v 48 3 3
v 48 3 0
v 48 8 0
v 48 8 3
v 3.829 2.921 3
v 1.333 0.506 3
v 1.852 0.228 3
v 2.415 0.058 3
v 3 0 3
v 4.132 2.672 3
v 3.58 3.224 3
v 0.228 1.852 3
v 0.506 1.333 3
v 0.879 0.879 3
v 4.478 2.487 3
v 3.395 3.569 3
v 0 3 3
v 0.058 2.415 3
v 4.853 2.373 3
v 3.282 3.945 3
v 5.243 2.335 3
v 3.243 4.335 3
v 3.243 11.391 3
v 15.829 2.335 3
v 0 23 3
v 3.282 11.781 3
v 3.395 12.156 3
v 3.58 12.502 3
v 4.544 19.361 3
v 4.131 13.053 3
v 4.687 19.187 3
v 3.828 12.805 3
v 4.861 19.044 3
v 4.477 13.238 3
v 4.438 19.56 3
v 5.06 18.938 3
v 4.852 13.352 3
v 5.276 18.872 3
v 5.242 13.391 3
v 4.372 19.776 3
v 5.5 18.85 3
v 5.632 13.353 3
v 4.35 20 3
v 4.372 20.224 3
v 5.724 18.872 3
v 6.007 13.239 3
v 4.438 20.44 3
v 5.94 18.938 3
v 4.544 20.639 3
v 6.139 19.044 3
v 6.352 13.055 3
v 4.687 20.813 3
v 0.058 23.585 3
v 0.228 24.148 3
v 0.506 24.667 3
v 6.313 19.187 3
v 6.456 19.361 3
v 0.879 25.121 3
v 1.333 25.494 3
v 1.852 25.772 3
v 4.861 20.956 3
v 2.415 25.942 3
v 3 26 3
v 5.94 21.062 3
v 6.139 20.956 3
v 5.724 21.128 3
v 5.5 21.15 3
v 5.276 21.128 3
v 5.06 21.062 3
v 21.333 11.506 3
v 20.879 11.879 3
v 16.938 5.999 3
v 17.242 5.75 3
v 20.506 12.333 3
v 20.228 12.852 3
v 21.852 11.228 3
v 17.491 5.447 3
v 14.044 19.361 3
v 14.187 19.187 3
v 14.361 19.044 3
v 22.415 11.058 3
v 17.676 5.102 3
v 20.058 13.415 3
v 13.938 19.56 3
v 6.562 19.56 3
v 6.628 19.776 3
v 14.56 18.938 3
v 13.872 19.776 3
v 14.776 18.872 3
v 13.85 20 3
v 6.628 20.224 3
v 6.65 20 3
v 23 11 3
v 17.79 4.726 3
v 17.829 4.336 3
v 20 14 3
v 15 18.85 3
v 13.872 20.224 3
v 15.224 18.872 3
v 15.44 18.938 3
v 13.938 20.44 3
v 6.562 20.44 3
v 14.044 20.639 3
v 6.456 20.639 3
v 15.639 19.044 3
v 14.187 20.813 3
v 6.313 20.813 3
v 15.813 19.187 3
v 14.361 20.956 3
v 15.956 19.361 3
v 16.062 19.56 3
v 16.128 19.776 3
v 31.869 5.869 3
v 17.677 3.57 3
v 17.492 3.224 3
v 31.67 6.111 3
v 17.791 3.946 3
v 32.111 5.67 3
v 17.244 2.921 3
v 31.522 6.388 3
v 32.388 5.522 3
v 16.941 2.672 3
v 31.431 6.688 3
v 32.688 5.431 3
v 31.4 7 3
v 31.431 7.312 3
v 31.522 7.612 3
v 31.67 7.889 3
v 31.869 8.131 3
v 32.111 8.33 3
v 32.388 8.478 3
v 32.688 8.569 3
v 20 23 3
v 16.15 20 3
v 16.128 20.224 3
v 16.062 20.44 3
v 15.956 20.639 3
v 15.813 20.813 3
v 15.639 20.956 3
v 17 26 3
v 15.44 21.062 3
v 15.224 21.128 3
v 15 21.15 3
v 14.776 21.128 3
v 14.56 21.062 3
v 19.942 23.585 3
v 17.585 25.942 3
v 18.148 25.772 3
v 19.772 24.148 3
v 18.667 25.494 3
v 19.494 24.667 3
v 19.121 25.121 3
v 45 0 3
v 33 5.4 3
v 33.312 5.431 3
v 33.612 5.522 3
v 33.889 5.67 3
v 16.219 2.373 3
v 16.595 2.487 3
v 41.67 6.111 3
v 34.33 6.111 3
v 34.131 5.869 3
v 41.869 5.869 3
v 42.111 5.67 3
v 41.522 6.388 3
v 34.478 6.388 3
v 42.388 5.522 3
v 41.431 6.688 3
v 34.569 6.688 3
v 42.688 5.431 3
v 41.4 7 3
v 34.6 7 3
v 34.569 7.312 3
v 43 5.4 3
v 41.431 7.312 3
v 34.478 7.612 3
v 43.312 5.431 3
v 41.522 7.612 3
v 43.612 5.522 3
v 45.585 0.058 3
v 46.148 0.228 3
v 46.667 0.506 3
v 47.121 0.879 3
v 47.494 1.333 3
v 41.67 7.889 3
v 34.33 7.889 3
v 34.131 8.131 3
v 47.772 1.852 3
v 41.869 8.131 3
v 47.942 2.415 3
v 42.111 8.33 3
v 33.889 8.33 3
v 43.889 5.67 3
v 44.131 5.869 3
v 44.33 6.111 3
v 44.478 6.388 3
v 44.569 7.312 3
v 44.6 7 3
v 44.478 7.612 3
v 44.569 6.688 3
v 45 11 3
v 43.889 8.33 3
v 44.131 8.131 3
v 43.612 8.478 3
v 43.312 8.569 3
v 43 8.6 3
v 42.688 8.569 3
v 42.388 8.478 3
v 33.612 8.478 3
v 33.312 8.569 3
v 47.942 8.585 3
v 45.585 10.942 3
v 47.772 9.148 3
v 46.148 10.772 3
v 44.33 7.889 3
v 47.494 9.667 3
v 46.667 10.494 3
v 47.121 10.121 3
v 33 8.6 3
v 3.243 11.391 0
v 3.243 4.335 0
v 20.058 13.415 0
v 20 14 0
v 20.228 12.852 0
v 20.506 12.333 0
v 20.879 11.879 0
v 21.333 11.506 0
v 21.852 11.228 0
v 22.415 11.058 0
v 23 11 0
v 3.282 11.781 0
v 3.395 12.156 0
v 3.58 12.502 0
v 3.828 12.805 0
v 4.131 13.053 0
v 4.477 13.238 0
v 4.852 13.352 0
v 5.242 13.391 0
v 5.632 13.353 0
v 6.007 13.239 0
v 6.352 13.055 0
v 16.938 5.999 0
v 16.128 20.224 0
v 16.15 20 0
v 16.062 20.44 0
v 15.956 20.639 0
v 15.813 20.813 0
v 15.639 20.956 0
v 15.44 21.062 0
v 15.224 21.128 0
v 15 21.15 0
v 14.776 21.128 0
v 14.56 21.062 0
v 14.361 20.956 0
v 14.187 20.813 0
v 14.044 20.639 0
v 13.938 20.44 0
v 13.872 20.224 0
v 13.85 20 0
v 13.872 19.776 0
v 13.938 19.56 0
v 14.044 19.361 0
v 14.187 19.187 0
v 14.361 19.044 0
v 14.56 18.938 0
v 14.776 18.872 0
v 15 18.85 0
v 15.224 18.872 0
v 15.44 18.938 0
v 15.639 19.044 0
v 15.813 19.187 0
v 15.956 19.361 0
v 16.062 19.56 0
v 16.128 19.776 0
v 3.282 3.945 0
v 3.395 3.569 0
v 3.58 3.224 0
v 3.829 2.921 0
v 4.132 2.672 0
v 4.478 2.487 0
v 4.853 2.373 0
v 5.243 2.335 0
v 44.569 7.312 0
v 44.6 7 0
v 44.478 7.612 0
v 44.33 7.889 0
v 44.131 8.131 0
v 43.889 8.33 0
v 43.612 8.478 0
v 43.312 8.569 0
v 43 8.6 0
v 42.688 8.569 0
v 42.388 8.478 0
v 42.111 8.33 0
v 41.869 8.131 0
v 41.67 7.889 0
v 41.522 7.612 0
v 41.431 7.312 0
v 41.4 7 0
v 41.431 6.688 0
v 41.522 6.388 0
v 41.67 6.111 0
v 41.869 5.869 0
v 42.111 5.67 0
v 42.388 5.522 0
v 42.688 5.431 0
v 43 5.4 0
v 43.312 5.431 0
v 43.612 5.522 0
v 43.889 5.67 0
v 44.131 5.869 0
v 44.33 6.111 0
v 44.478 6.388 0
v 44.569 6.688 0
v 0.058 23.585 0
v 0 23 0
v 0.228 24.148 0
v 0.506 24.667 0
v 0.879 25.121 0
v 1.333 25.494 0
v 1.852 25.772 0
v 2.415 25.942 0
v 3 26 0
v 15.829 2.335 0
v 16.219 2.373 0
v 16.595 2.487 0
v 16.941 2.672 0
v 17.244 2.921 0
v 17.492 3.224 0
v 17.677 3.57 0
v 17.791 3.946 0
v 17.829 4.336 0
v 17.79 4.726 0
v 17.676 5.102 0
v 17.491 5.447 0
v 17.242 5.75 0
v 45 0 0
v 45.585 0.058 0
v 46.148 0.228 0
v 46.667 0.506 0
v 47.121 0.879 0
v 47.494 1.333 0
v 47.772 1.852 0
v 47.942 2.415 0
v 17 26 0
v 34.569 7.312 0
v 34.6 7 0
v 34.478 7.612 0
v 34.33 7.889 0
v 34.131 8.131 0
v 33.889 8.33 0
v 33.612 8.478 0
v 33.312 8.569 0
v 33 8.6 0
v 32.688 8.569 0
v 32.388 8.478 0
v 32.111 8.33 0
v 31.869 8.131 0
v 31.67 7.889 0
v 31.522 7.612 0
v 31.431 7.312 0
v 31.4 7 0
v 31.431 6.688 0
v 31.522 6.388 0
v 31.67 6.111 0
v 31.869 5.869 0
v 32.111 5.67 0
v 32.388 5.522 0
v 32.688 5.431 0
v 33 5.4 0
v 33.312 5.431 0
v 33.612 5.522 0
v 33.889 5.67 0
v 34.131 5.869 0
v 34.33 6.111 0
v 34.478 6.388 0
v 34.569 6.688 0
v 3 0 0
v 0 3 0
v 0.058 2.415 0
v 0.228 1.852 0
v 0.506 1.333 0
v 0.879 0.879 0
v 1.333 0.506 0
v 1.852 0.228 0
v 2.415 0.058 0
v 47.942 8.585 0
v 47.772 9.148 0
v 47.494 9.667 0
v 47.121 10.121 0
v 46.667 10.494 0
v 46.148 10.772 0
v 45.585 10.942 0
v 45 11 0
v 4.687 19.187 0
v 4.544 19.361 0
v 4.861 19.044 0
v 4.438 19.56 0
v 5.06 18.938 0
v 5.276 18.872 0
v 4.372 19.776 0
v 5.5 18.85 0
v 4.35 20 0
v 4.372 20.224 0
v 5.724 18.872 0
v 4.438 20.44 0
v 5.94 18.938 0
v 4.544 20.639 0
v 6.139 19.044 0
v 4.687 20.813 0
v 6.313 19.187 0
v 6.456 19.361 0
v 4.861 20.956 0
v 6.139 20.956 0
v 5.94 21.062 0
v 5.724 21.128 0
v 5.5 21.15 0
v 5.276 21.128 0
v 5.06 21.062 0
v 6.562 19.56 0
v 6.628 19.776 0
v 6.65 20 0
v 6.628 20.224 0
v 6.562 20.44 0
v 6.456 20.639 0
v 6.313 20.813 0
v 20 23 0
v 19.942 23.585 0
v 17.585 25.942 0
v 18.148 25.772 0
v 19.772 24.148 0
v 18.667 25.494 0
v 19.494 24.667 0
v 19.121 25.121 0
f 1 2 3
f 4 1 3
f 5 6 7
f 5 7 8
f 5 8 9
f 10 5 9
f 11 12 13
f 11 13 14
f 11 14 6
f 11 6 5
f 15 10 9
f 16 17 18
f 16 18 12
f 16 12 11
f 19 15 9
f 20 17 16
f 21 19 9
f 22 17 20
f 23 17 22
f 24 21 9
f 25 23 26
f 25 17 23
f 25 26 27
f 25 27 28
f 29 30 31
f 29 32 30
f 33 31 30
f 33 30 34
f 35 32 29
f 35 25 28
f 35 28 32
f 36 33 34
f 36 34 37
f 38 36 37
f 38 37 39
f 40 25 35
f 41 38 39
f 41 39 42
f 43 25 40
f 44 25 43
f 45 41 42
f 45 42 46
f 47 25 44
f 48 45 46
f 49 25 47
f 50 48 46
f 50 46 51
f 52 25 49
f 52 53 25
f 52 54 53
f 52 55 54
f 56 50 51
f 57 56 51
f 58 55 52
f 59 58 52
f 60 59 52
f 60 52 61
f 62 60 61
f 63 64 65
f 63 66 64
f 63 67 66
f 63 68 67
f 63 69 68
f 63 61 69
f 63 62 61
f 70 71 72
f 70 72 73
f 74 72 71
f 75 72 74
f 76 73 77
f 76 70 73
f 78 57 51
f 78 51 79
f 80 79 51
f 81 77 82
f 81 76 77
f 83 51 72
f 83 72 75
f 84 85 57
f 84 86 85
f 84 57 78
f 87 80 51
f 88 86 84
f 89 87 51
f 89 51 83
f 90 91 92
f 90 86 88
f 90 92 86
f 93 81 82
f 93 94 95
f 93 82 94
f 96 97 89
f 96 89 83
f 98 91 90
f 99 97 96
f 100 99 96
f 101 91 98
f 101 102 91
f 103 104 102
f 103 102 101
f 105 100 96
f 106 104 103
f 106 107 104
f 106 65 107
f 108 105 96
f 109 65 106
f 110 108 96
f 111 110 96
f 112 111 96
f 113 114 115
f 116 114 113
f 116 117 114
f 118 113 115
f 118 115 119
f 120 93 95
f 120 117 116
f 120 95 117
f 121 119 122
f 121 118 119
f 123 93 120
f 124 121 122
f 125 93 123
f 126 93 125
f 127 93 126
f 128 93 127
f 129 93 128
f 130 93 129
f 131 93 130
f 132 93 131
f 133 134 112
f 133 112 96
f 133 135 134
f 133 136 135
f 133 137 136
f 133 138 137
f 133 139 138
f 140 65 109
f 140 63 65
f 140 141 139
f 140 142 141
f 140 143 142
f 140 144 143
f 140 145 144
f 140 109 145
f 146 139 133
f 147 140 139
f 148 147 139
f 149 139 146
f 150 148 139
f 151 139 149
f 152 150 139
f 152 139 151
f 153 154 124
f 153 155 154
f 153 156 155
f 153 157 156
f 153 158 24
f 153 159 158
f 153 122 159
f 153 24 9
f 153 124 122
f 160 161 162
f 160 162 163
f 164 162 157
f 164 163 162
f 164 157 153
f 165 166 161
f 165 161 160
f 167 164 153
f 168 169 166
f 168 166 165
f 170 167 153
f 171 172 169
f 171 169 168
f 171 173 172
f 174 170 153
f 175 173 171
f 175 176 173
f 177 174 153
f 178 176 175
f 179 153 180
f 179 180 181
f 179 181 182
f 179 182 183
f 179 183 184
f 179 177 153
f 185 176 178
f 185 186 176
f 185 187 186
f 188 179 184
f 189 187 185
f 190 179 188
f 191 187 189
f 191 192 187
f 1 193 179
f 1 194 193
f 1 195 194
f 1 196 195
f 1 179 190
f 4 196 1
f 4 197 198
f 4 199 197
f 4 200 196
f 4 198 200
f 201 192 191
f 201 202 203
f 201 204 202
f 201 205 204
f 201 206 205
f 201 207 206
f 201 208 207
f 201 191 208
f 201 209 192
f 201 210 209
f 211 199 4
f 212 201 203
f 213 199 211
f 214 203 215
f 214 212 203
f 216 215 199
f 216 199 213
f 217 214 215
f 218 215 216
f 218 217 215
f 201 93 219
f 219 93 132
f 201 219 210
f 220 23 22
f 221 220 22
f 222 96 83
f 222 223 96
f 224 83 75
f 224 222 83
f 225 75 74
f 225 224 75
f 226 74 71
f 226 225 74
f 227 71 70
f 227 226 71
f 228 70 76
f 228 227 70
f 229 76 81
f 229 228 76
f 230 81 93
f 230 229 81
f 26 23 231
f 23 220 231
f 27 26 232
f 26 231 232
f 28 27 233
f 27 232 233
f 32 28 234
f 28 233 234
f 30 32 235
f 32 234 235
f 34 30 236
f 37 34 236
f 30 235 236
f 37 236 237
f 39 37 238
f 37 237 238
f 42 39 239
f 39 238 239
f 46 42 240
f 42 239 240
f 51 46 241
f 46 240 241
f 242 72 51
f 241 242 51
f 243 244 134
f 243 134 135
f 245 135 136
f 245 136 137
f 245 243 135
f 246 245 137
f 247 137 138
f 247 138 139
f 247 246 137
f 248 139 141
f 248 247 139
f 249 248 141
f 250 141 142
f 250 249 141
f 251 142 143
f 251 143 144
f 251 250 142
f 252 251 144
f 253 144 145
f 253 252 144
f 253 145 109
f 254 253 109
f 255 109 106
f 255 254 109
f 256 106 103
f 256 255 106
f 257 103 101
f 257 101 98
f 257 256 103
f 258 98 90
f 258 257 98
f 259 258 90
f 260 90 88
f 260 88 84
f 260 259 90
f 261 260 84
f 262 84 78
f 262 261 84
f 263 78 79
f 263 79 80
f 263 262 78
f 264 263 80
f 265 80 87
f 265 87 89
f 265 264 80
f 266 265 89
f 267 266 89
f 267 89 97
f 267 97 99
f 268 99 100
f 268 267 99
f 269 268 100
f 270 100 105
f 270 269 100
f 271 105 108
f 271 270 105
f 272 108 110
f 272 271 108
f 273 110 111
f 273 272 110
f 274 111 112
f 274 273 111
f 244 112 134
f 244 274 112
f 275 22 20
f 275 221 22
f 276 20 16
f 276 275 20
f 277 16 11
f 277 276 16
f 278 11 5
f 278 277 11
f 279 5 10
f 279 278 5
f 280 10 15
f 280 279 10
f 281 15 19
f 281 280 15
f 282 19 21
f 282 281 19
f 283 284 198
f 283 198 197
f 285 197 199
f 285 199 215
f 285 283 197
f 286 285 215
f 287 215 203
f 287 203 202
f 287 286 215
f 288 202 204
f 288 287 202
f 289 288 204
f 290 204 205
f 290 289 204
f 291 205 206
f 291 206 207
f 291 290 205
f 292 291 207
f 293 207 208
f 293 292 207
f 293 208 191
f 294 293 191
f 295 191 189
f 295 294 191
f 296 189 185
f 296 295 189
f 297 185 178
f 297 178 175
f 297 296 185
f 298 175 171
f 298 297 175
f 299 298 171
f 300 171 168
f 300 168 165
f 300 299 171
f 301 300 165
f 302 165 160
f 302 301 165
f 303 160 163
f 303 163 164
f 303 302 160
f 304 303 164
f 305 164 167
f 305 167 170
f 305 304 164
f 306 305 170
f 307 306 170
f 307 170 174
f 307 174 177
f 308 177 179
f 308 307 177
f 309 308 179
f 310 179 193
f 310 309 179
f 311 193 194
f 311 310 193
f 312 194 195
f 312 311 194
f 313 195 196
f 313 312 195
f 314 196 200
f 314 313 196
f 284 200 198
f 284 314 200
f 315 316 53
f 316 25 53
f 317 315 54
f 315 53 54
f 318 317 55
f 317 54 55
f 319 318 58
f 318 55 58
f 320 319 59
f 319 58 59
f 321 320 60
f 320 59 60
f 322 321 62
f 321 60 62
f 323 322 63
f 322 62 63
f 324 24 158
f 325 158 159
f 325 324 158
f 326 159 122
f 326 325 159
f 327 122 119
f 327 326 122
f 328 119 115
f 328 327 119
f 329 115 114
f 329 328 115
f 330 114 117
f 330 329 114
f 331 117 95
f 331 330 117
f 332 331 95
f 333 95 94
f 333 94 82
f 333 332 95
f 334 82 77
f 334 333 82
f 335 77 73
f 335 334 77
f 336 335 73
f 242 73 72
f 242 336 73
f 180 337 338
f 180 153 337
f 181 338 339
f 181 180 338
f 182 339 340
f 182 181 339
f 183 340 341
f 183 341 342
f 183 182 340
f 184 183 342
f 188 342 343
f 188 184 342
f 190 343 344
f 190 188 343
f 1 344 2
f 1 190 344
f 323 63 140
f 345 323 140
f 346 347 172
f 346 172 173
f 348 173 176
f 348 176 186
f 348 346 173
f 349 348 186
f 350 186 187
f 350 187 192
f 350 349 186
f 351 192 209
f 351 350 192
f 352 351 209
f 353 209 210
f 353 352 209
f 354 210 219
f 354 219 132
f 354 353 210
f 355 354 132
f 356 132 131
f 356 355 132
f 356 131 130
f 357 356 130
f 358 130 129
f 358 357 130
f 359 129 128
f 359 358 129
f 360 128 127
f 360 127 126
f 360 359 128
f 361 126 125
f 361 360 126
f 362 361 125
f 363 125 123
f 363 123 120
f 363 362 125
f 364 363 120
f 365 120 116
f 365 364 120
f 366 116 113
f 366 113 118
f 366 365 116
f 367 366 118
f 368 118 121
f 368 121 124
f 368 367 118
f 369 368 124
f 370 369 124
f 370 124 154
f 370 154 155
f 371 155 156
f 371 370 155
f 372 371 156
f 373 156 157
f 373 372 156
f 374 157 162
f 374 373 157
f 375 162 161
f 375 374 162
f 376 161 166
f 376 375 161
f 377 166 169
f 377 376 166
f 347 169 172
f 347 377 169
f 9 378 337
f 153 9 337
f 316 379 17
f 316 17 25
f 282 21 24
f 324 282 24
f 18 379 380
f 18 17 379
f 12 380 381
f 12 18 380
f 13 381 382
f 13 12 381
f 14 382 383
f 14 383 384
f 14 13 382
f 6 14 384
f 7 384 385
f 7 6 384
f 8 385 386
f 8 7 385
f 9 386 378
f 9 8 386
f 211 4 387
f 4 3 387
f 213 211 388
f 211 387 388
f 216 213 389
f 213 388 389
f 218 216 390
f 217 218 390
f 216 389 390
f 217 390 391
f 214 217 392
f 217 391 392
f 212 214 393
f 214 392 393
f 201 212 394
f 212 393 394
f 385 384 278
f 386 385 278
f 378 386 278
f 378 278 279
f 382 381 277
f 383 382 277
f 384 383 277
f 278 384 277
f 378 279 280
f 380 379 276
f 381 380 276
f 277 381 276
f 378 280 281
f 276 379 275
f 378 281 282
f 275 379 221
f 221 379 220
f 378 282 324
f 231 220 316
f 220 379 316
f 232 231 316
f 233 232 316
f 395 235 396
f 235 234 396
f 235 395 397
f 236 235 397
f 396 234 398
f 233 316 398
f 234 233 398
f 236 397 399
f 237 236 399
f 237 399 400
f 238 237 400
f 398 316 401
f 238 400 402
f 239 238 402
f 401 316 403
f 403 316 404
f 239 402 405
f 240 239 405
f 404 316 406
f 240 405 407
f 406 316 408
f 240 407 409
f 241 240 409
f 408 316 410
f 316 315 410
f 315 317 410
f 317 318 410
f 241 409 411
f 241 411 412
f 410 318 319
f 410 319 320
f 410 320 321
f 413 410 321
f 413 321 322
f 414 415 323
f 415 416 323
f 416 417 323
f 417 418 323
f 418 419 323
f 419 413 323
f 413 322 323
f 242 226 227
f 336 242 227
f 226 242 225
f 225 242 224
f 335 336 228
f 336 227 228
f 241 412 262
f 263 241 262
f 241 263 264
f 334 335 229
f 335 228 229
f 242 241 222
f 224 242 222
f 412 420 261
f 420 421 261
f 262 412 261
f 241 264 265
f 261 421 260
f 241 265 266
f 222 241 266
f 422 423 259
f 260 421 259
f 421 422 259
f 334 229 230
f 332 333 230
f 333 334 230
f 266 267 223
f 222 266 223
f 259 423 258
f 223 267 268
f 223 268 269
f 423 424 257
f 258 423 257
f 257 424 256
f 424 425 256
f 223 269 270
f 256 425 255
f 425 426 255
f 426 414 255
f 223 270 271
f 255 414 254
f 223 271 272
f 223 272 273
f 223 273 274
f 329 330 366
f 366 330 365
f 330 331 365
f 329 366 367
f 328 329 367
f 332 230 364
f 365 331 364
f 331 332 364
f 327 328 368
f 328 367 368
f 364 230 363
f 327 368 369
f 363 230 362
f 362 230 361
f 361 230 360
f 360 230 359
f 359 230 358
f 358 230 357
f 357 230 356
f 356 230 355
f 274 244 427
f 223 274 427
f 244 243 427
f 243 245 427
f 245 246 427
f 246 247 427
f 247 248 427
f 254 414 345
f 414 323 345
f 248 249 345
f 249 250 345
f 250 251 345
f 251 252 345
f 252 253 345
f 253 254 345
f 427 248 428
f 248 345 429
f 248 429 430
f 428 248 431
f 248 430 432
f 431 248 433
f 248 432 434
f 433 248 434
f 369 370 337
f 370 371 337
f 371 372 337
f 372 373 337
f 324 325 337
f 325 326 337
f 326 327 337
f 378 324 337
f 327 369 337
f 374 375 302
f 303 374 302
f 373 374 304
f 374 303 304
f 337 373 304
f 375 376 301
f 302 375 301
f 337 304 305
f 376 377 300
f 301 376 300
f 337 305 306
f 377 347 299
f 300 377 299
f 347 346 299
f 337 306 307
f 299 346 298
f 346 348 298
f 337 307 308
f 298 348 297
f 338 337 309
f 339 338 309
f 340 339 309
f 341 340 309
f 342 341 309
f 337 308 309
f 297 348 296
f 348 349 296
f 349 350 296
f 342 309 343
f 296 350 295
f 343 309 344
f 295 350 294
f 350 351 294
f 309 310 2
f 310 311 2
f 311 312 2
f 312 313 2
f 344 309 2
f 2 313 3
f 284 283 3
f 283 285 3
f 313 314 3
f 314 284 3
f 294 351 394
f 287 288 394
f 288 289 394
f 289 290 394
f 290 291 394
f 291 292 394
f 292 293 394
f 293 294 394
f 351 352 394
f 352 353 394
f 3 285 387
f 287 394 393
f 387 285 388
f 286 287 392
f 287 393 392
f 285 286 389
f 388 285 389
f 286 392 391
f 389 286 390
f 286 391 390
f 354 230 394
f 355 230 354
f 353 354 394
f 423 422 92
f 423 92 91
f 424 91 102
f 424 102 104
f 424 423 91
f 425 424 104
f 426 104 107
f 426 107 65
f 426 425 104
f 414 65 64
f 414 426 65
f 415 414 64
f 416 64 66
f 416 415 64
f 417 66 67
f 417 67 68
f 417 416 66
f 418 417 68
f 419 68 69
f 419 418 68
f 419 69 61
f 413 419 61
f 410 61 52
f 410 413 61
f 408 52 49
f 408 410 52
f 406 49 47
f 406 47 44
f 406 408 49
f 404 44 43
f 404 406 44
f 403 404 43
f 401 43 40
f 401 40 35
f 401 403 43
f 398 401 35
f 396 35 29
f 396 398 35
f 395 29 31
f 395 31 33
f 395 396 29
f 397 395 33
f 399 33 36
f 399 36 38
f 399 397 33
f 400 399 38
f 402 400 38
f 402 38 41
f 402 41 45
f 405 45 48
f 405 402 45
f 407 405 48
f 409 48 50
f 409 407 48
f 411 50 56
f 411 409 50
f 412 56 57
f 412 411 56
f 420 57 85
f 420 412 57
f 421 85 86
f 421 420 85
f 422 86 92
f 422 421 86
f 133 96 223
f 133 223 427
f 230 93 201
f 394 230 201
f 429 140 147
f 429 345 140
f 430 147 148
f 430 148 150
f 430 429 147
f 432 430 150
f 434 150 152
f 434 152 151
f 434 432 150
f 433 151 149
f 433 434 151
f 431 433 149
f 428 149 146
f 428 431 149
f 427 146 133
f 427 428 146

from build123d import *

# Parameters (mm, degrees)
SKETCH_1_W          = 48
SKETCH_1_H          = 67.5
SKETCH_1_R          = 1.6
SKETCH_1_R_2        = 1.15
EXTRUDE_1_DEPTH     = 3
SKETCH_3_W          = 28
SKETCH_3_H          = 56.5
CUT_EXTRUDE_1_DEPTH = 4
FILLET_1_R          = 3
SKETCH_5_W          = 37.363309984
SKETCH_5_H          = 43.840284148
CUT_EXTRUDE_2_DEPTH = 10
FILLET_2_R          = 3
CUT_EXTRUDE_3_DEPTH = 10
FILLET_3_R          = 2


with BuildPart() as part:
    # 草图1 → 凸台-拉伸1 (new body)
    with BuildSketch(Plane.XY):
        with Locations((24, 33.75)):
            Rectangle(SKETCH_1_W, SKETCH_1_H)
        with Locations((33, 7)):
            Circle(SKETCH_1_R, mode=Mode.SUBTRACT)
        with Locations((43, 7)):
            Circle(SKETCH_1_R, mode=Mode.SUBTRACT)
        with Locations((5.5, 20)):
            Circle(SKETCH_1_R_2, mode=Mode.SUBTRACT)
        with Locations((15, 20)):
            Circle(SKETCH_1_R_2, mode=Mode.SUBTRACT)
    extrude(amount=EXTRUDE_1_DEPTH)

    # 草图3 → 切除-拉伸1 (cut, through all)
    with BuildSketch(Plane.XY.offset(3)):
        with Locations((34, 39.25)):
            Rectangle(SKETCH_3_W, SKETCH_3_H)
    extrude(amount=-CUT_EXTRUDE_1_DEPTH, mode=Mode.SUBTRACT)

    # 圆角1
    fillet_1_edges = [part.edges().sort_by_distance(p)[0] for p in [
        (48, 11, 1.5),
        (20, 11, 1.5),
        (20, 67.5, 1.5),
        (0, 67.5, 1.5),
        (48, 0, 1.5),
        (0, 0, 1.5),
    ]]
    fillet(fillet_1_edges, radius=FILLET_1_R)

    # 草图5 → 切除-拉伸2 (cut)
    with BuildSketch(Plane.XY.offset(3)):
        with Locations((12.934999088, 47.920142074)):
            Rectangle(SKETCH_5_W, SKETCH_5_H)
    extrude(amount=-CUT_EXTRUDE_2_DEPTH, mode=Mode.SUBTRACT)

    # 圆角2
    fillet_2_edges = [part.edges().sort_by_distance(p)[0] for p in [
        (20, 26, 1.5),
        (0, 26, 1.5),
    ]]
    fillet(fillet_2_edges, radius=FILLET_2_R)

    # 草图6 → 切除-拉伸3 (cut)
    with BuildSketch(Plane.XY.offset(3)):
        Polygon((3.243199116, 15.127643762), (3.243199116, 2.334759345), (22.435417019, 2.334759345), align=None)
    extrude(amount=-CUT_EXTRUDE_3_DEPTH, mode=Mode.SUBTRACT)

    # 圆角3
    fillet_3_edges = [part.edges().sort_by_distance(p)[0] for p in [
        (3.243199116, 15.127643762, 1.5),
        (22.435417019, 2.334759345, 1.5),
        (3.243199116, 2.334759345, 1.5),
    ]]
    fillet(fillet_3_edges, radius=FILLET_3_R)


solid = part.part
